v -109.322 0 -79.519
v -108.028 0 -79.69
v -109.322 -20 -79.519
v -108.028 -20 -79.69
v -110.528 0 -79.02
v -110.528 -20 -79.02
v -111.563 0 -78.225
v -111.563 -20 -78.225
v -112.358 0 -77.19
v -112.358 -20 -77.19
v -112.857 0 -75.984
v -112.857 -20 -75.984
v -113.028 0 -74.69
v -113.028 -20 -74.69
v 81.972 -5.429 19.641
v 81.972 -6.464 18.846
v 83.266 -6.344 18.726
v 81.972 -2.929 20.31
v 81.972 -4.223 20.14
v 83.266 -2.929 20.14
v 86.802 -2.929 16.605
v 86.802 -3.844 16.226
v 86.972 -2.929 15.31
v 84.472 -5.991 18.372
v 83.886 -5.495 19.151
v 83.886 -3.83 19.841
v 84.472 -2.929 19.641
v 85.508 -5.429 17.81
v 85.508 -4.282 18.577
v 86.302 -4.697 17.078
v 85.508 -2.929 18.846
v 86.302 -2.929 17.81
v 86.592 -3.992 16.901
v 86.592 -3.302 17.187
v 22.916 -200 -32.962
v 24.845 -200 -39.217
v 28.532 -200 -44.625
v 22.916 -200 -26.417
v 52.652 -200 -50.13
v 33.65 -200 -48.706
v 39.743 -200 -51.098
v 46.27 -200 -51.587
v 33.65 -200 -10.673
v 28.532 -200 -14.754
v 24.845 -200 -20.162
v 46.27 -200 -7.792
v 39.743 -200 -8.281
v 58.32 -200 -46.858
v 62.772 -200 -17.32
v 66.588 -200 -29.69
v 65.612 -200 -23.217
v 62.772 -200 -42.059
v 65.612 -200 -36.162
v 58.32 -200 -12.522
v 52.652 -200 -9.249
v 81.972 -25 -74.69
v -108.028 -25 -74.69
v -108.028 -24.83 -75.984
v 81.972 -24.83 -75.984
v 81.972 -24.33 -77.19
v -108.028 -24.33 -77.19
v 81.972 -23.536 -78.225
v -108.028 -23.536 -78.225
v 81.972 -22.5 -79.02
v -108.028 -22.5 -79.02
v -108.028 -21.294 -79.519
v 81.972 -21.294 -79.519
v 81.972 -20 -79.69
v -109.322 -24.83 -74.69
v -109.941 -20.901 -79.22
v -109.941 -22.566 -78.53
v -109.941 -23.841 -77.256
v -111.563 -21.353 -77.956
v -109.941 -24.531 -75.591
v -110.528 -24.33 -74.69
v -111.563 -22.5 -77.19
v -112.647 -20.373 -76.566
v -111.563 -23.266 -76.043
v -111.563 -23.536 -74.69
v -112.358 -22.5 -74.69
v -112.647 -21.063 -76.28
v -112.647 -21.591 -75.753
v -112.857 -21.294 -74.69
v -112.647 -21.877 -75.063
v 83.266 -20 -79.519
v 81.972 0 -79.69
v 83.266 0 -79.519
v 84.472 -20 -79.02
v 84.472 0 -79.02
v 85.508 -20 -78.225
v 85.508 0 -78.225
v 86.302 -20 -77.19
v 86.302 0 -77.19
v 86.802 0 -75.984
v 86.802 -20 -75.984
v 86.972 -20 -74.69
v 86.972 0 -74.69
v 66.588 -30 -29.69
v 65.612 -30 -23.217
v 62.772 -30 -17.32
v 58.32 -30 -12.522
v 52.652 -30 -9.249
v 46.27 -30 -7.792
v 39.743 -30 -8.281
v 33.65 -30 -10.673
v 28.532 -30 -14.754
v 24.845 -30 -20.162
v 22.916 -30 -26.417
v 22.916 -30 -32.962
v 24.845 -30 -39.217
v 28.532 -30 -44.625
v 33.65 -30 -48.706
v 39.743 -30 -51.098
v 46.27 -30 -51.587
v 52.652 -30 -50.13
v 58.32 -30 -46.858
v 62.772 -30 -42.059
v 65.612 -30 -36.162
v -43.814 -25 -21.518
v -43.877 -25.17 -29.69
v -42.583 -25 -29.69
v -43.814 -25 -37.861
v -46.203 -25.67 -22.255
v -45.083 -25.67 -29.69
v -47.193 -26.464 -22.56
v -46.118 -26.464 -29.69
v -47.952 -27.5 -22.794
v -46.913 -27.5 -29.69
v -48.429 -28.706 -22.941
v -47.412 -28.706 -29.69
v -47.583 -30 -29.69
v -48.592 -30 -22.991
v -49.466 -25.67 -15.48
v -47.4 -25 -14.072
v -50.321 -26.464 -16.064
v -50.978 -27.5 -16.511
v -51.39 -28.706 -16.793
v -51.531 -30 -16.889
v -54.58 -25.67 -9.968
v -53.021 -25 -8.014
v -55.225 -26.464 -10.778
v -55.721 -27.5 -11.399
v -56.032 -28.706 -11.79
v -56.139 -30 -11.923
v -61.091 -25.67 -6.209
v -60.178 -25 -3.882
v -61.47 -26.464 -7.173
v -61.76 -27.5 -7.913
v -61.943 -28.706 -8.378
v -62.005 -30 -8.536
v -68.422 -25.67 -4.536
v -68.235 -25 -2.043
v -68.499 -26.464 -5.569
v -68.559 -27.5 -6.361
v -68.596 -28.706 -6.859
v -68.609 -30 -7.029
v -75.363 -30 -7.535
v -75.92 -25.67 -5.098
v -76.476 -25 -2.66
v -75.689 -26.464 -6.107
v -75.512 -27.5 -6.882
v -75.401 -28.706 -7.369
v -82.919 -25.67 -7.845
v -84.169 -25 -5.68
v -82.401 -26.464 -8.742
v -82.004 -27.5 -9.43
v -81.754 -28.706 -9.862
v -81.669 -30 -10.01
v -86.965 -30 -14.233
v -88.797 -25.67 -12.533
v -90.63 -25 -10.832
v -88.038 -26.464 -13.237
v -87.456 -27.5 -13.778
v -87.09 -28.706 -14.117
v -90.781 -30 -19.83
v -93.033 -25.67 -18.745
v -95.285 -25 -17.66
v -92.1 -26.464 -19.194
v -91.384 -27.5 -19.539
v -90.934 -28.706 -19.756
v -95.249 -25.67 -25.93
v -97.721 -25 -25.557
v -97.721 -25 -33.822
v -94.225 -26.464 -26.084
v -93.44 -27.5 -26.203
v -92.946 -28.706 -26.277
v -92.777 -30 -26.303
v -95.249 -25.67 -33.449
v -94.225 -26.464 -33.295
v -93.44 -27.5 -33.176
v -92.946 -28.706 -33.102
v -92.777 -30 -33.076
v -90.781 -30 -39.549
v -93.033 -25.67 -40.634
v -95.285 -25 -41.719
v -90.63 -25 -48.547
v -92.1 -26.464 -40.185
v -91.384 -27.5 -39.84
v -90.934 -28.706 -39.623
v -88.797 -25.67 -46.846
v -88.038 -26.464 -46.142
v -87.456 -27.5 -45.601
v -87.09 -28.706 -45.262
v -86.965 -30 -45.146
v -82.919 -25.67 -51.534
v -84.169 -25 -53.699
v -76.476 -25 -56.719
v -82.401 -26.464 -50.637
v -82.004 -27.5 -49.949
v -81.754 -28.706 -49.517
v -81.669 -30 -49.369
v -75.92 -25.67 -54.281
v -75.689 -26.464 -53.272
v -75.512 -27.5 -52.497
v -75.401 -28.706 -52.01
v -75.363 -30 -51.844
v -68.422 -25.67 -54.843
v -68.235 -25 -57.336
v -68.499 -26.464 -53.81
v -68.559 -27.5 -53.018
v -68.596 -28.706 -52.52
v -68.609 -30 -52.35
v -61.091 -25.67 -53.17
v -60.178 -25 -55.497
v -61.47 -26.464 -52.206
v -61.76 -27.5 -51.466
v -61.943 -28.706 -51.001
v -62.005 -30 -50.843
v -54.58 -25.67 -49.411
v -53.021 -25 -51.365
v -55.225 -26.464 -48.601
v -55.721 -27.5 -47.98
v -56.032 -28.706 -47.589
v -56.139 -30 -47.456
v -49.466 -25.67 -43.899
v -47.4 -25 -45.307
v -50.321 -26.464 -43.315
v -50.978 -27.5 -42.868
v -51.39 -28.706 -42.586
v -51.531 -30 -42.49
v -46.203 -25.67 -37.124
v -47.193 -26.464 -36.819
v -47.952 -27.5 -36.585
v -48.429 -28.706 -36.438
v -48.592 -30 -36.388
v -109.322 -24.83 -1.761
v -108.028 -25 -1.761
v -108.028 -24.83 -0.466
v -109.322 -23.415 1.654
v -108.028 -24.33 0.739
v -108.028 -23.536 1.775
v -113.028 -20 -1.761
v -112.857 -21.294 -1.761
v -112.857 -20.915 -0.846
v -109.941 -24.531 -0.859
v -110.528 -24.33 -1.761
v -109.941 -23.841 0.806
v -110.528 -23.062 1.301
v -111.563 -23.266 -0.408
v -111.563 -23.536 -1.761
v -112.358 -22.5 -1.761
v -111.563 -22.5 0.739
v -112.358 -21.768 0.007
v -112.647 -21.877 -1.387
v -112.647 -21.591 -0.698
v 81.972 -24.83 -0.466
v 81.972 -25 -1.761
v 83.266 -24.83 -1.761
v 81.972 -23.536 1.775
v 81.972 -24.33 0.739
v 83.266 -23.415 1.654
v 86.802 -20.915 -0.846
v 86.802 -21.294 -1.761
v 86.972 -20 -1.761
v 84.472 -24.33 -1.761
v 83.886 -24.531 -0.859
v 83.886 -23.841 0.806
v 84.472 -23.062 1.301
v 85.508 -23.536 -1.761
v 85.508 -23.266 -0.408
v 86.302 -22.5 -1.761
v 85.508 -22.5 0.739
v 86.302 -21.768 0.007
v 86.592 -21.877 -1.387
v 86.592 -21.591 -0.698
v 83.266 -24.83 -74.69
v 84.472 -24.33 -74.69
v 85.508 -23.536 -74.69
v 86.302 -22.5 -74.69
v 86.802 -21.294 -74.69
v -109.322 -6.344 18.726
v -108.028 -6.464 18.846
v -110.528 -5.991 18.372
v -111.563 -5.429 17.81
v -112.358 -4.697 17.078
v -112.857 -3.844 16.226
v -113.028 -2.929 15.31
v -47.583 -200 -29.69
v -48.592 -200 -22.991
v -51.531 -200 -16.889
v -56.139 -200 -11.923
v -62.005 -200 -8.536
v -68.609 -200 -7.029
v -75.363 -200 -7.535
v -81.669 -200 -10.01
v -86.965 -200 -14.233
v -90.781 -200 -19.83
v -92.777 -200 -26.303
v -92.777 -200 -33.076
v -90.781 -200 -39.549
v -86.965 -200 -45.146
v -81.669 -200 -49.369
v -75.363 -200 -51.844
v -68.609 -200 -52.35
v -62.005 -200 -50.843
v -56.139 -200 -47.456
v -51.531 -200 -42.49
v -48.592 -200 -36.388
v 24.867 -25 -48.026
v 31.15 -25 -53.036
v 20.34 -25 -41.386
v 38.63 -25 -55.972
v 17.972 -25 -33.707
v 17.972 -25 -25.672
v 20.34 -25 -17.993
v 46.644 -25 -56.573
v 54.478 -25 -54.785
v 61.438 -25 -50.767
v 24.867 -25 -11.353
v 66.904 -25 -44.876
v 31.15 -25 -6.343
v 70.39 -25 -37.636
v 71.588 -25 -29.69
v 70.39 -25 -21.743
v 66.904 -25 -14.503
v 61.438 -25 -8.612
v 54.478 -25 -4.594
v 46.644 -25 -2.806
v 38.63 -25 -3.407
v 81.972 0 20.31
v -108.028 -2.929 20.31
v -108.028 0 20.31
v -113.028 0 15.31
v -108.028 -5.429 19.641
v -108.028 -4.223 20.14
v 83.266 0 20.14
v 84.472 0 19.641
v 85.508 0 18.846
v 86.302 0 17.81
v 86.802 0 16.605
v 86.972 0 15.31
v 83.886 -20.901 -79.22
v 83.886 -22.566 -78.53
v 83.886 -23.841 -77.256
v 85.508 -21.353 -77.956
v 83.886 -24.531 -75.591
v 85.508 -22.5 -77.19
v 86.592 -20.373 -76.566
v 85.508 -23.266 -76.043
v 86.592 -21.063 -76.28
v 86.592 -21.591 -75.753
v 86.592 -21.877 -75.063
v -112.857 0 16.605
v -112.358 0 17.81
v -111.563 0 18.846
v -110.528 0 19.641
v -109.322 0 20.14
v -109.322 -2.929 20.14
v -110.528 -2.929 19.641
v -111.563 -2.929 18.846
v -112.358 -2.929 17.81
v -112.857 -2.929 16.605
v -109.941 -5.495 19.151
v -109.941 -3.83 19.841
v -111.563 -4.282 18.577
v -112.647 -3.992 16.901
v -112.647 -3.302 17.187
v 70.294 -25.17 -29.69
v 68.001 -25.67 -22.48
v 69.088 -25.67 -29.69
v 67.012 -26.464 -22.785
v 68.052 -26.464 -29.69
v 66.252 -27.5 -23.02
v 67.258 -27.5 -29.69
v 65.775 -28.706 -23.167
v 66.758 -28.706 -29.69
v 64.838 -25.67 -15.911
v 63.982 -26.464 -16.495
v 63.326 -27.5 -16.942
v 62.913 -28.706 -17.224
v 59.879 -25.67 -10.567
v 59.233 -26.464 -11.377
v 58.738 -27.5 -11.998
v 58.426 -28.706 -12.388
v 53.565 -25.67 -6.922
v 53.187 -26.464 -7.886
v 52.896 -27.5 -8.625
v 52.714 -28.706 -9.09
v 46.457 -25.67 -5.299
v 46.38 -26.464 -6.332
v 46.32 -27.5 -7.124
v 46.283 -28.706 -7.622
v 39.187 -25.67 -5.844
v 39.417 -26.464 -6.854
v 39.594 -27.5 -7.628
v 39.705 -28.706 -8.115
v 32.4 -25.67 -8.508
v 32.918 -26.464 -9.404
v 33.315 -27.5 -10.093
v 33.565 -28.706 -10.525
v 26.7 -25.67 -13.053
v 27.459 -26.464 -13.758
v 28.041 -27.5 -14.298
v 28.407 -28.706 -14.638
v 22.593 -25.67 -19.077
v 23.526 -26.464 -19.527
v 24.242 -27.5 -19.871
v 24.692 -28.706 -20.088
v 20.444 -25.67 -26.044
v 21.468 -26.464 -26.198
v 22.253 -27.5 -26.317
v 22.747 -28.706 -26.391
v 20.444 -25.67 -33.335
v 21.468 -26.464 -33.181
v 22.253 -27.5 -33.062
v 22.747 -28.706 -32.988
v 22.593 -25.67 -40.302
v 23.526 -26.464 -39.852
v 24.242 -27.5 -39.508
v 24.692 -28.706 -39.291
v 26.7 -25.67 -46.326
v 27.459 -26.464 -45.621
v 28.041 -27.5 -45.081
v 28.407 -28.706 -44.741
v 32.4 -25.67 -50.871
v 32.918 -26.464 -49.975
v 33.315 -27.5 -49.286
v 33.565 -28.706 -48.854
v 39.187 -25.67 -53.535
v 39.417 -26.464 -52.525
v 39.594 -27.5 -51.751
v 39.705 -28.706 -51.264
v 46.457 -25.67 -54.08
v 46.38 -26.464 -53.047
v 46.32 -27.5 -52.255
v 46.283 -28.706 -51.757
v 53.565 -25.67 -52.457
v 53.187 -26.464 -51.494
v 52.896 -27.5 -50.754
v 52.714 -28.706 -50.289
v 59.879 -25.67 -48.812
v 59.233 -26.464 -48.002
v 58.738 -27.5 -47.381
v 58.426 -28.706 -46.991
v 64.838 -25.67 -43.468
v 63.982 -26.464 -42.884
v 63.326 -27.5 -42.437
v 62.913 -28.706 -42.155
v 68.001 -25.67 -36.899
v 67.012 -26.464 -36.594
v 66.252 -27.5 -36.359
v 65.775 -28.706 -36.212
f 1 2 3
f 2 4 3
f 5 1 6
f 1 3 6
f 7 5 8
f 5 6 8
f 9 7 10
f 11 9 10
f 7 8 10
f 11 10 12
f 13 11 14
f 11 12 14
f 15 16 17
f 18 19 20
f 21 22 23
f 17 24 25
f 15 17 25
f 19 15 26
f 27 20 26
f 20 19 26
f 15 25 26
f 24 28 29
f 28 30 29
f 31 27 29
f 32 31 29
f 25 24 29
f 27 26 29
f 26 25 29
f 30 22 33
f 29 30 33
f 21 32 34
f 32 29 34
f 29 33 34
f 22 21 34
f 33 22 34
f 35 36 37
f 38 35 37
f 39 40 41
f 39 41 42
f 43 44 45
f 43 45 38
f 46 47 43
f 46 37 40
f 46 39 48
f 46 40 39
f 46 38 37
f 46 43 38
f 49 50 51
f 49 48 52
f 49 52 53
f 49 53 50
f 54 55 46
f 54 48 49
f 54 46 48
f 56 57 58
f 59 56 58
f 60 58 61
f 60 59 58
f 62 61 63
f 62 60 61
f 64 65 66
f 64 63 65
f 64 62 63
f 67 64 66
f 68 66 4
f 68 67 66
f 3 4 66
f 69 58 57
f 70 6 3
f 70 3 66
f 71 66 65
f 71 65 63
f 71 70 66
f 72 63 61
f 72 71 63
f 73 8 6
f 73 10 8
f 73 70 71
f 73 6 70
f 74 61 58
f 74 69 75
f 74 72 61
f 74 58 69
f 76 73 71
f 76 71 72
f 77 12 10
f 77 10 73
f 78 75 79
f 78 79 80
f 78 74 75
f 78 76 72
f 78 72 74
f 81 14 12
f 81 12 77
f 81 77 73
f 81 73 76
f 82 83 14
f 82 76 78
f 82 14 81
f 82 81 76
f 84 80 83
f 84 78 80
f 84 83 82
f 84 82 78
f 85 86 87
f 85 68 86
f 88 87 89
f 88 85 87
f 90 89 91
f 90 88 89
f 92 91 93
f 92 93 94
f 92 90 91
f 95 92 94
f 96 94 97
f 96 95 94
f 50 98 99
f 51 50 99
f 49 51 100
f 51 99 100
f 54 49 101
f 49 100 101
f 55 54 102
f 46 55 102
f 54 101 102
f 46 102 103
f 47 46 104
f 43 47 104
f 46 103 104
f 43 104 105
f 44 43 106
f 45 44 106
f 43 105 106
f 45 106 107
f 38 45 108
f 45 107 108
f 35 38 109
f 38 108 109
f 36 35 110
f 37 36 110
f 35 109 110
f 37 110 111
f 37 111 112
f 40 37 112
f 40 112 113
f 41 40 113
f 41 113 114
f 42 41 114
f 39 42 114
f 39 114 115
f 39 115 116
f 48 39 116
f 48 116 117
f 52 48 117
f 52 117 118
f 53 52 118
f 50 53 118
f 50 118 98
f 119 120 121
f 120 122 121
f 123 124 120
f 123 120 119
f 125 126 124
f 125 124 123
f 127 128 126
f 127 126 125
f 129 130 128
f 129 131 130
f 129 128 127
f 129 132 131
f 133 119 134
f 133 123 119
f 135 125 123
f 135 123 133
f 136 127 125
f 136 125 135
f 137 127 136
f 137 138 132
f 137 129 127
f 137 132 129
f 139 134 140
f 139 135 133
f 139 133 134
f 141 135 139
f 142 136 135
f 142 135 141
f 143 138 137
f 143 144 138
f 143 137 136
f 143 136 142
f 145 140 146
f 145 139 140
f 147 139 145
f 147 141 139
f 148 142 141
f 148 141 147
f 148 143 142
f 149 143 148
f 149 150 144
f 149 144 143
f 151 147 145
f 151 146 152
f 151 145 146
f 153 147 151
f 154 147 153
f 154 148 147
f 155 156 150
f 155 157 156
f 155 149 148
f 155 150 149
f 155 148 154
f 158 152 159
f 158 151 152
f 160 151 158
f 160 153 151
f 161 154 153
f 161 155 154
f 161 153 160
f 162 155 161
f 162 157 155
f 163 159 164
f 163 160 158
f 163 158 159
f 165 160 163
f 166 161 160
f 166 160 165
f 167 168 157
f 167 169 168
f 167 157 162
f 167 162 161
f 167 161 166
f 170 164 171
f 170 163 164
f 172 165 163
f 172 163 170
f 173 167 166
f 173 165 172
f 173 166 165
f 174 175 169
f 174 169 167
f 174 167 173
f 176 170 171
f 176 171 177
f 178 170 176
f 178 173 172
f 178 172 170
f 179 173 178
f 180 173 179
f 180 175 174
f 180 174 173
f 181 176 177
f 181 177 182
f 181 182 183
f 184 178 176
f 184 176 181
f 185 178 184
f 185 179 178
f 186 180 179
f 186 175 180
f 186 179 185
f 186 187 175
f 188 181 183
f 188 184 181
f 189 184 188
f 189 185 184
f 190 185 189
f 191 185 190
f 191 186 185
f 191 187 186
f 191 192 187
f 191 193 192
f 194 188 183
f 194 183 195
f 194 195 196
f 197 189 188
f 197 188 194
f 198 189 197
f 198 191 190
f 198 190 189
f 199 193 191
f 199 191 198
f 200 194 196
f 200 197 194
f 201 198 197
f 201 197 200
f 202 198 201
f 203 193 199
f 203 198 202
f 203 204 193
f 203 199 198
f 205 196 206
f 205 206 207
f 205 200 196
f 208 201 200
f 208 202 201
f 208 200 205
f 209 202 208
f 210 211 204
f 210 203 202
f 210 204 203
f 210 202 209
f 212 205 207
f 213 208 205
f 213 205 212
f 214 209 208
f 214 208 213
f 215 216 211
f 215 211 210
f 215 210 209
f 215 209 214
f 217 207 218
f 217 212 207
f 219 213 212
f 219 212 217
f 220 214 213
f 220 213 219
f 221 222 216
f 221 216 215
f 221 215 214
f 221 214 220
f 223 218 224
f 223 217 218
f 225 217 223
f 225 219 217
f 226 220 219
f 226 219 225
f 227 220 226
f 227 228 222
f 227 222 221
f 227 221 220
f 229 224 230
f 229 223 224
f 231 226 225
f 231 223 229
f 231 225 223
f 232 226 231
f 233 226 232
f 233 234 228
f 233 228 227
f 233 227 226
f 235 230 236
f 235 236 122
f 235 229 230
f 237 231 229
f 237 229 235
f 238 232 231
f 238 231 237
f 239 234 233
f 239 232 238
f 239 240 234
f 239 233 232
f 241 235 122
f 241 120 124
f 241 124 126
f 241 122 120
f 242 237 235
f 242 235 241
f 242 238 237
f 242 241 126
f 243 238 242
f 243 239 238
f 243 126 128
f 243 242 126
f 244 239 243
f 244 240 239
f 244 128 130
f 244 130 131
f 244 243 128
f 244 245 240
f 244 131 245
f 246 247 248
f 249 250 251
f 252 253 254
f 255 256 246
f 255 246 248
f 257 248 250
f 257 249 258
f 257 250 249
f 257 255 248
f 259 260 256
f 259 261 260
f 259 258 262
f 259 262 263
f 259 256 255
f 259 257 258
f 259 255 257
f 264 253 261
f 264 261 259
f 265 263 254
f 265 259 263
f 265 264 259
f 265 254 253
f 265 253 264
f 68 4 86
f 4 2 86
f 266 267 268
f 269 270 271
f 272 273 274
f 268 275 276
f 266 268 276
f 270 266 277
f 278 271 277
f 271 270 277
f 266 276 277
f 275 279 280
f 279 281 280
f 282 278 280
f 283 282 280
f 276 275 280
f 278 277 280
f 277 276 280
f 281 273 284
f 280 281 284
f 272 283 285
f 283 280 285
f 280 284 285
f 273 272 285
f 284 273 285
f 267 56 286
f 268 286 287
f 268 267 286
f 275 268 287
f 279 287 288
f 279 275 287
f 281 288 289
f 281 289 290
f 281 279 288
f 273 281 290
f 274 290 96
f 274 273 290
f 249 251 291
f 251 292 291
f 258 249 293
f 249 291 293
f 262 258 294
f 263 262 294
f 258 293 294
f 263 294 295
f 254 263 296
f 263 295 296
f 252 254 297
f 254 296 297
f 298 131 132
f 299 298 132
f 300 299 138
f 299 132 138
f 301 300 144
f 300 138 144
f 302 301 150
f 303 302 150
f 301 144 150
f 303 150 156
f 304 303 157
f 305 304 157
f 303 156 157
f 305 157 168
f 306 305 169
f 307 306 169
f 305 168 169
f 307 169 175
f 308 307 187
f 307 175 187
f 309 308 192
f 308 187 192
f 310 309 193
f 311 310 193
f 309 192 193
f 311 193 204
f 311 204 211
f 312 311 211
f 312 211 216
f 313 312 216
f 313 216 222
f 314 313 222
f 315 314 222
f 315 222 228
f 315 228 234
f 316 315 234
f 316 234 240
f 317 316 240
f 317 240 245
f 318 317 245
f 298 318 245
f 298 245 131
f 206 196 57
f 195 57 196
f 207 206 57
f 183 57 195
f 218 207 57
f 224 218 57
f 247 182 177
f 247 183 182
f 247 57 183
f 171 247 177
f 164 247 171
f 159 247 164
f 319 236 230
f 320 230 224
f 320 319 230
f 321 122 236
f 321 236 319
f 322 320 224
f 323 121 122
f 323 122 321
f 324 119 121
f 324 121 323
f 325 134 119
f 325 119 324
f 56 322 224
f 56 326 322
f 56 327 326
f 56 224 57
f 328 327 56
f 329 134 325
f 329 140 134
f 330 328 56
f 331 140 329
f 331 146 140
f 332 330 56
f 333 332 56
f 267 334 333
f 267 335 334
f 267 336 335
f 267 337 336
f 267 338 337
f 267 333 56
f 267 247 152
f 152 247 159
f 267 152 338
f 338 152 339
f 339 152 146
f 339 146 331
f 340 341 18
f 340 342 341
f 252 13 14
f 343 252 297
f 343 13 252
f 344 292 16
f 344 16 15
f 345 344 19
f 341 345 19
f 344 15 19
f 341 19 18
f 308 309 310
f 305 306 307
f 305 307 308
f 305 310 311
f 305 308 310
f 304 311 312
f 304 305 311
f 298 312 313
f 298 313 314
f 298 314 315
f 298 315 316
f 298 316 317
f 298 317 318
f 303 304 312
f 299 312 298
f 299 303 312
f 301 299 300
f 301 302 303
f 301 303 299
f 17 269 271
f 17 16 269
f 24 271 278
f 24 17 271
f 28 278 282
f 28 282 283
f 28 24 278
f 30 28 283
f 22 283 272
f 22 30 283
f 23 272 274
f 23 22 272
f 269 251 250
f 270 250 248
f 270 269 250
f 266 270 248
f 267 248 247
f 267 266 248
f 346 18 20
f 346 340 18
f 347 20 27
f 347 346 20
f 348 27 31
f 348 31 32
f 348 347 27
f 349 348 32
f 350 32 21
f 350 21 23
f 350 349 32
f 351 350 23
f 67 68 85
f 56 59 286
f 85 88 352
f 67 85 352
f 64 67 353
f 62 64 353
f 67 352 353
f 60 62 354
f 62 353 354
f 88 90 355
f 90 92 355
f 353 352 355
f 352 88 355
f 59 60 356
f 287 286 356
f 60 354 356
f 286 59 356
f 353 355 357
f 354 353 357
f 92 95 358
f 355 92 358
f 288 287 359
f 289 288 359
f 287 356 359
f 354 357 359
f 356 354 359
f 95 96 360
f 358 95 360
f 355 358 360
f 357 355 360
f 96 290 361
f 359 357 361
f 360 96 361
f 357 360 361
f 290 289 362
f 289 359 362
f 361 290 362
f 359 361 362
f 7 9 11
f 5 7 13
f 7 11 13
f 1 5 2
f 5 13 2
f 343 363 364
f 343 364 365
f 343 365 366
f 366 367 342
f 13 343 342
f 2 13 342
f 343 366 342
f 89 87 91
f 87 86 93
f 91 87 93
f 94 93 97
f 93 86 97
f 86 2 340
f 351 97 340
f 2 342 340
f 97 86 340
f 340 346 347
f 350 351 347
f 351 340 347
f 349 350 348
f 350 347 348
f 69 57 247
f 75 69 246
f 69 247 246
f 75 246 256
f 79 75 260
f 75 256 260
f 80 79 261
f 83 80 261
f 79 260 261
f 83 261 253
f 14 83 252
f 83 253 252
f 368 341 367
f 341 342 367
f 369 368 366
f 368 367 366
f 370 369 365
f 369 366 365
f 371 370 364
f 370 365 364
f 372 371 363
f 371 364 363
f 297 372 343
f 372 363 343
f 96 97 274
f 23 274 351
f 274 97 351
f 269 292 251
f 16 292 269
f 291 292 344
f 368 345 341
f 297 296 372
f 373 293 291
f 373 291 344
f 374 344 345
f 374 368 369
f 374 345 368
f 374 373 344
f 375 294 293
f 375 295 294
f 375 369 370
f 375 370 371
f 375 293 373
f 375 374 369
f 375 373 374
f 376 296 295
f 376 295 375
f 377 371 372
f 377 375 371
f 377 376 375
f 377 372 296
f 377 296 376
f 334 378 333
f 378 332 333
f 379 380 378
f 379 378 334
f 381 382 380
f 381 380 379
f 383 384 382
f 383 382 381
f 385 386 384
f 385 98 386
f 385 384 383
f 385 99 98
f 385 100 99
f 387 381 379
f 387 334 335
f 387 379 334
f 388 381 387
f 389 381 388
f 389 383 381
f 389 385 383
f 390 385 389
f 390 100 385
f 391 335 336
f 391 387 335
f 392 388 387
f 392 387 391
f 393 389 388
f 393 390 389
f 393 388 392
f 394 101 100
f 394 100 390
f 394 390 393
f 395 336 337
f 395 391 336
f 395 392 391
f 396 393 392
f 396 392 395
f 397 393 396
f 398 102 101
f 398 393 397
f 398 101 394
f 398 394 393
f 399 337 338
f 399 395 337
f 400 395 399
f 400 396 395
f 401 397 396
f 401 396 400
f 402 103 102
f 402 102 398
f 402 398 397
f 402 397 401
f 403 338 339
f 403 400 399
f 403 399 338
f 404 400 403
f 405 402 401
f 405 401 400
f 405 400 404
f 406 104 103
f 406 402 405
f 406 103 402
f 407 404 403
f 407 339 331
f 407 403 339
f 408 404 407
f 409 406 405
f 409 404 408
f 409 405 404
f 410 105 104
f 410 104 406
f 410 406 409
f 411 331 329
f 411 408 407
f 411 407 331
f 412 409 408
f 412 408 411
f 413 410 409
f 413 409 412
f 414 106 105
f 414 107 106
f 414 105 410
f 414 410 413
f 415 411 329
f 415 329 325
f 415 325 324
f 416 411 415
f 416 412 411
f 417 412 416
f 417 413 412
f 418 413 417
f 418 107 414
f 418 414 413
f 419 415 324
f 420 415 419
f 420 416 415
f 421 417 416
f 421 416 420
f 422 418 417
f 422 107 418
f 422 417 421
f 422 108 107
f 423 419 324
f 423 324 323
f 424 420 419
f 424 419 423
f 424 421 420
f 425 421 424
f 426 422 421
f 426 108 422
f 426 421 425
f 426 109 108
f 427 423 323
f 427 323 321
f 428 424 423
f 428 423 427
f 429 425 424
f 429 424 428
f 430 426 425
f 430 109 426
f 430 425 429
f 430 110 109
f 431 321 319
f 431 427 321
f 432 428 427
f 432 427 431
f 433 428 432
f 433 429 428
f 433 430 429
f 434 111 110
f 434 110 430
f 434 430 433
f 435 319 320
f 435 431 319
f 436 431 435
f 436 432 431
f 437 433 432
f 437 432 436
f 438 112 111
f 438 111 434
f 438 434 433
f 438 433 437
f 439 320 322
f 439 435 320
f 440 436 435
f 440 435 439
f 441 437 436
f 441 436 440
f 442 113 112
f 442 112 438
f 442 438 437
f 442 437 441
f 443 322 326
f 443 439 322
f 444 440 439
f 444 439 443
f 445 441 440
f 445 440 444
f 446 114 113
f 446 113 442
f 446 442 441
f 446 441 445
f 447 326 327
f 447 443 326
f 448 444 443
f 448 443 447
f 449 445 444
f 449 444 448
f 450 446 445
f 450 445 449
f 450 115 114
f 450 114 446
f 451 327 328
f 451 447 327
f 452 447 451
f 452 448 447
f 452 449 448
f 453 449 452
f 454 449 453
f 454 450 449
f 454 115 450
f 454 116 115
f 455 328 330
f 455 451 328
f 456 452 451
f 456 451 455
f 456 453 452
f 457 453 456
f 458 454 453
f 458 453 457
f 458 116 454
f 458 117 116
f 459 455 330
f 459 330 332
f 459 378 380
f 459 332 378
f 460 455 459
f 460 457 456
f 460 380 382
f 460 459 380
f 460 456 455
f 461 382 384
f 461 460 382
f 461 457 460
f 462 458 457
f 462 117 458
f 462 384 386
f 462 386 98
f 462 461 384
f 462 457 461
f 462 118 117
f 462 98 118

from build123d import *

# Parameters (mm, degrees)
F0_W     = 200
F0_H     = 100
F0_R     = 22.7241513298
F0_R_2   = 21.9586845422
F1_DEPTH = 25
F2_DEPTH = 200
F3_SIZE  = 20
F4_F1_R  = 5
F4_F2_R  = 5
F4_F3_R  = 5
F4_F4_R  = 5
F4_F5_R  = 5
F4_F6_R  = 5
F4_F7_R  = 5


# Not quite as in the source:
# - a feature of the source that left no trace in its solid (it failed there, or was rolled back) is left out


with BuildPart() as f1:
    # F0 (on Front) → F1 (new body)
    with BuildSketch(Plane.XZ):
        with Locations((-13.0278225988, -29.689514604)):
            Rectangle(F0_W, F0_H)
        with Locations((-70.3068226576, -29.689514604)):
            Circle(F0_R, mode=Mode.SUBTRACT)
        with Locations((44.6292310953, -29.689514604)):
            Circle(F0_R_2, mode=Mode.SUBTRACT)
    extrude(amount=F1_DEPTH)

    # F0 (on Front) → F2 (join)
    with BuildSketch(Plane.XZ):
        with Locations((44.6292310953, -29.689514604)):
            Circle(F0_R_2)
        with Locations((-70.3068226576, -29.689514604)):
            Circle(F0_R)
    extrude(amount=F2_DEPTH)

    # F3
    f3_edges = [f1.edges().sort_by_distance(p)[0] for p in [
        (-13.027823, -25, 20.310485),
    ]]
    chamfer(f3_edges, length=F3_SIZE)

    # F4: fillet of radius 5 on 11 edges, made by hand

    # F4_f1
    f4_f1_edges = [f1.edges().sort_by_distance(p)[0] for p in [
        (-13.0278225988, -5, 20.310485396),
    ]]
    fillet(f4_f1_edges, radius=F4_F1_R)

    # F4_f2
    f4_f2_edges = [f1.edges().sort_by_distance(p)[0] for p in [
        (-13.0278225988, -25, 0.310485396),
    ]]
    fillet(f4_f2_edges, radius=F4_F2_R)

    # F4_f3
    f4_f3_edges = [f1.edges().sort_by_distance(p)[0] for p in [
        (-13.0278225988, -25, -79.689514604),
    ]]
    fillet(f4_f3_edges, radius=F4_F3_R)

    # F4_f4
    f4_f4_edges = [f1.edges().sort_by_distance(p)[0] for p in [
        (-93.0309739873, -25, -29.689514604),
    ]]
    fillet(f4_f4_edges, radius=F4_F4_R)

    # F4_f5
    f4_f5_edges = [f1.edges().sort_by_distance(p)[0] for p in [
        (22.6705465531, -25, -29.689514604),
    ]]
    fillet(f4_f5_edges, radius=F4_F5_R)

    # F4_f6
    f4_f6_edges = [f1.edges().sort_by_distance(p)[0] for p in [
        (86.9721774012, -25, -38.2250485099),
    ]]
    fillet(f4_f6_edges, radius=F4_F6_R)

    # F4_f7
    f4_f7_edges = [f1.edges().sort_by_distance(p)[0] for p in [
        (-113.0278225988, -25, -38.2250485099),
    ]]
    fillet(f4_f7_edges, radius=F4_F7_R)


solid = f1.part
